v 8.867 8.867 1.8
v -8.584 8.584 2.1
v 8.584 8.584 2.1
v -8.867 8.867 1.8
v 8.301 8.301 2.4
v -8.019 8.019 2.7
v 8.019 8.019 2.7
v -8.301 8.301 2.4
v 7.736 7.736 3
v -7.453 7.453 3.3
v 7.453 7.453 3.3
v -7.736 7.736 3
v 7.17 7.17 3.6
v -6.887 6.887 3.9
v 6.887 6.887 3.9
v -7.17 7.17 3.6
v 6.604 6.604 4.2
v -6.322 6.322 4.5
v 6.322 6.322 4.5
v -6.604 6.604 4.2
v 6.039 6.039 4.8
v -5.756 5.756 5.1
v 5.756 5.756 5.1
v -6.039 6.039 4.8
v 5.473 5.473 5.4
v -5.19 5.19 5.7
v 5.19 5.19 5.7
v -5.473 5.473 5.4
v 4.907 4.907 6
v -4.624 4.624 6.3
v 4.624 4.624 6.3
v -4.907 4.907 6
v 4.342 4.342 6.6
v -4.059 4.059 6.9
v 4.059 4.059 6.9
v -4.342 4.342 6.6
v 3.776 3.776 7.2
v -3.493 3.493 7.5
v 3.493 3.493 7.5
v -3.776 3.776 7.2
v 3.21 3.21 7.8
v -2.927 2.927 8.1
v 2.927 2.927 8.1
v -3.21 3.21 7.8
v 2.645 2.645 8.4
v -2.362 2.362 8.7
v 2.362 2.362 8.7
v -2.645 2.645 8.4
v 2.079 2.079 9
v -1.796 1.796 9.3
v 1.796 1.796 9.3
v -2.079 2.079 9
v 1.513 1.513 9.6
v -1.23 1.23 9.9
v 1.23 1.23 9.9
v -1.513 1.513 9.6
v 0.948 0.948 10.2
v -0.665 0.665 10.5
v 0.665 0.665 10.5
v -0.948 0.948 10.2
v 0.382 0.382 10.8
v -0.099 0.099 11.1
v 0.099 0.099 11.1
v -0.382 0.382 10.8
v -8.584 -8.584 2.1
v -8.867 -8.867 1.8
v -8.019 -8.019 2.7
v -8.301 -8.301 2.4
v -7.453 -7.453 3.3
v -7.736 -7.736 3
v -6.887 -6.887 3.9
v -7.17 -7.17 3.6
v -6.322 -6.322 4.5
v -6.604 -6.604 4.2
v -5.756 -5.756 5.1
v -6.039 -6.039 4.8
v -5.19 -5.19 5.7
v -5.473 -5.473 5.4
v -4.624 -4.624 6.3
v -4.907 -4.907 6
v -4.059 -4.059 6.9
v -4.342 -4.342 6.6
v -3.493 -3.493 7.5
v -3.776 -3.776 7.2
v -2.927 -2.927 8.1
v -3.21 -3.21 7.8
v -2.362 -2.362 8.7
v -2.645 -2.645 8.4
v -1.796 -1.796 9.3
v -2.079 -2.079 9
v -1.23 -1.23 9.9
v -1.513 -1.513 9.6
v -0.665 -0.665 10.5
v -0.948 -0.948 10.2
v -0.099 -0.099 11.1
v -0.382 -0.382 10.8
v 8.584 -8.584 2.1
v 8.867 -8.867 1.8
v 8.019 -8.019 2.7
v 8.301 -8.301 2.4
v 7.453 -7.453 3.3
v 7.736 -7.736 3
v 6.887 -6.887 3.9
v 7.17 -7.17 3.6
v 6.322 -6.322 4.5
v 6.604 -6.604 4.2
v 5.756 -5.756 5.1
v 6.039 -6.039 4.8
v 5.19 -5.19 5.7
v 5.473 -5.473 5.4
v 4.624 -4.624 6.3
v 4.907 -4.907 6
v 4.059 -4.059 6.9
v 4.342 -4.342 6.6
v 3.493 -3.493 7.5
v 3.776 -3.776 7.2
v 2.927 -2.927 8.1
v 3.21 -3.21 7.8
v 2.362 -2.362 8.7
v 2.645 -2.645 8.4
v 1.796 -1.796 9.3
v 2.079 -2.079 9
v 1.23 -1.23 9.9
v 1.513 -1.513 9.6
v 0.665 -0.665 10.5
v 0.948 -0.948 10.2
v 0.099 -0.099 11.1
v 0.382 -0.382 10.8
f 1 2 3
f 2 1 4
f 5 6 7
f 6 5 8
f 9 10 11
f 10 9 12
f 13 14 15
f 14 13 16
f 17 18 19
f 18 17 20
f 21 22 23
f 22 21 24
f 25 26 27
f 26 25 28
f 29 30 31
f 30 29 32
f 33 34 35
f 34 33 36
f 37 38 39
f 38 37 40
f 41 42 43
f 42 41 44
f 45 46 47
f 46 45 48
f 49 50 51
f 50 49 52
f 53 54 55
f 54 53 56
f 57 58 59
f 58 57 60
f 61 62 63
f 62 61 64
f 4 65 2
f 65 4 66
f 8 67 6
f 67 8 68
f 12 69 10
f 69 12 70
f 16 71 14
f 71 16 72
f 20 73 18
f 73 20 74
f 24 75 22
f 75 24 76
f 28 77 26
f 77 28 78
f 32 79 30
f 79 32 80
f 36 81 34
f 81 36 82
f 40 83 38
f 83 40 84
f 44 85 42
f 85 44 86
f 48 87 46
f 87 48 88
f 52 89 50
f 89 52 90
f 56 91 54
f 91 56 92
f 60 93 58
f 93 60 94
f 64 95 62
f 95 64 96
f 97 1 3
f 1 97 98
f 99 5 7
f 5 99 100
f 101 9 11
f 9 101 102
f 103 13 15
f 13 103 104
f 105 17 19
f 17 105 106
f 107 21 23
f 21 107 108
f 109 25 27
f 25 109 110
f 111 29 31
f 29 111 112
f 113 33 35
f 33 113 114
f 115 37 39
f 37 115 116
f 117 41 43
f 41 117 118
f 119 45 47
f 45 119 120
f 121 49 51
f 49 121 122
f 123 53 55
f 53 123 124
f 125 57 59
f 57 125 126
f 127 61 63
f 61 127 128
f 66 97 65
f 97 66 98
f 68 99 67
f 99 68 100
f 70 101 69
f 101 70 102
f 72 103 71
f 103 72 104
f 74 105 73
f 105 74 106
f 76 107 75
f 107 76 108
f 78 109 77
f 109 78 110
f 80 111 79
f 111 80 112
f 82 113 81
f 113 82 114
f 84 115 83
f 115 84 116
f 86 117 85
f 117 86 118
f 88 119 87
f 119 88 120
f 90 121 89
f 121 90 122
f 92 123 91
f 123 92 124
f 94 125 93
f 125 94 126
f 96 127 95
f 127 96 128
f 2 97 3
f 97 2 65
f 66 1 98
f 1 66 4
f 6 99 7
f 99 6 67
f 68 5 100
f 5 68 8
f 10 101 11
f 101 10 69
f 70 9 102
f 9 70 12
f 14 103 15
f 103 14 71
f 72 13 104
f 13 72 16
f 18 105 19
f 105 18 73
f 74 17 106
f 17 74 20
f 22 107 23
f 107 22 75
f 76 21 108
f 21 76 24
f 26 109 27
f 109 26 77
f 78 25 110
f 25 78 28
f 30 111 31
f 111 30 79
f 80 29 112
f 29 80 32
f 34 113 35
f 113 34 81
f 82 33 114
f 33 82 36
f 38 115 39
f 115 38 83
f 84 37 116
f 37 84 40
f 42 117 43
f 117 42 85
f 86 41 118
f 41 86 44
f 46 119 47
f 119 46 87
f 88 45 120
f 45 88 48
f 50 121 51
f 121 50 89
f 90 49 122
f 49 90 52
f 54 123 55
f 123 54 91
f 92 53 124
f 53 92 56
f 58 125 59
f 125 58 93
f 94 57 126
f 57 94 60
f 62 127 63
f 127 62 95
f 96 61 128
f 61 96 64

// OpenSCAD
// Tests for layer switching

m=0.707;
base=0.6;

intersection(){
difference(){
union(){
    // base
    color("green")
    translate([-10,-10,0])
    cube([20,20,base]);

    // pyramid
    translate([0,0,base])
    rotate([0,0,45])
    cylinder(15*m,20*m,0,$fn=4);
}


union(){
    // Test text on the bottom side

    translate([0,0,0])
    rotate([0,0,45])
    mirror([1,0,0]) color("red") 
    linear_extrude(height=0.3){
        text("Love", font = "Open Sans:style=Bold", size=5,halign="center",valign="center",spacing=1.1);
    }

    }

}

// Test for layer slicing
Zslice=0.3;
Nslice=20;
Z0=6*Zslice;
union(){
for(i=[0:Nslice]){
    translate([-10,-10,i*Zslice*2+Z0])
    cube([20,20,Zslice]);
    }
}

}
